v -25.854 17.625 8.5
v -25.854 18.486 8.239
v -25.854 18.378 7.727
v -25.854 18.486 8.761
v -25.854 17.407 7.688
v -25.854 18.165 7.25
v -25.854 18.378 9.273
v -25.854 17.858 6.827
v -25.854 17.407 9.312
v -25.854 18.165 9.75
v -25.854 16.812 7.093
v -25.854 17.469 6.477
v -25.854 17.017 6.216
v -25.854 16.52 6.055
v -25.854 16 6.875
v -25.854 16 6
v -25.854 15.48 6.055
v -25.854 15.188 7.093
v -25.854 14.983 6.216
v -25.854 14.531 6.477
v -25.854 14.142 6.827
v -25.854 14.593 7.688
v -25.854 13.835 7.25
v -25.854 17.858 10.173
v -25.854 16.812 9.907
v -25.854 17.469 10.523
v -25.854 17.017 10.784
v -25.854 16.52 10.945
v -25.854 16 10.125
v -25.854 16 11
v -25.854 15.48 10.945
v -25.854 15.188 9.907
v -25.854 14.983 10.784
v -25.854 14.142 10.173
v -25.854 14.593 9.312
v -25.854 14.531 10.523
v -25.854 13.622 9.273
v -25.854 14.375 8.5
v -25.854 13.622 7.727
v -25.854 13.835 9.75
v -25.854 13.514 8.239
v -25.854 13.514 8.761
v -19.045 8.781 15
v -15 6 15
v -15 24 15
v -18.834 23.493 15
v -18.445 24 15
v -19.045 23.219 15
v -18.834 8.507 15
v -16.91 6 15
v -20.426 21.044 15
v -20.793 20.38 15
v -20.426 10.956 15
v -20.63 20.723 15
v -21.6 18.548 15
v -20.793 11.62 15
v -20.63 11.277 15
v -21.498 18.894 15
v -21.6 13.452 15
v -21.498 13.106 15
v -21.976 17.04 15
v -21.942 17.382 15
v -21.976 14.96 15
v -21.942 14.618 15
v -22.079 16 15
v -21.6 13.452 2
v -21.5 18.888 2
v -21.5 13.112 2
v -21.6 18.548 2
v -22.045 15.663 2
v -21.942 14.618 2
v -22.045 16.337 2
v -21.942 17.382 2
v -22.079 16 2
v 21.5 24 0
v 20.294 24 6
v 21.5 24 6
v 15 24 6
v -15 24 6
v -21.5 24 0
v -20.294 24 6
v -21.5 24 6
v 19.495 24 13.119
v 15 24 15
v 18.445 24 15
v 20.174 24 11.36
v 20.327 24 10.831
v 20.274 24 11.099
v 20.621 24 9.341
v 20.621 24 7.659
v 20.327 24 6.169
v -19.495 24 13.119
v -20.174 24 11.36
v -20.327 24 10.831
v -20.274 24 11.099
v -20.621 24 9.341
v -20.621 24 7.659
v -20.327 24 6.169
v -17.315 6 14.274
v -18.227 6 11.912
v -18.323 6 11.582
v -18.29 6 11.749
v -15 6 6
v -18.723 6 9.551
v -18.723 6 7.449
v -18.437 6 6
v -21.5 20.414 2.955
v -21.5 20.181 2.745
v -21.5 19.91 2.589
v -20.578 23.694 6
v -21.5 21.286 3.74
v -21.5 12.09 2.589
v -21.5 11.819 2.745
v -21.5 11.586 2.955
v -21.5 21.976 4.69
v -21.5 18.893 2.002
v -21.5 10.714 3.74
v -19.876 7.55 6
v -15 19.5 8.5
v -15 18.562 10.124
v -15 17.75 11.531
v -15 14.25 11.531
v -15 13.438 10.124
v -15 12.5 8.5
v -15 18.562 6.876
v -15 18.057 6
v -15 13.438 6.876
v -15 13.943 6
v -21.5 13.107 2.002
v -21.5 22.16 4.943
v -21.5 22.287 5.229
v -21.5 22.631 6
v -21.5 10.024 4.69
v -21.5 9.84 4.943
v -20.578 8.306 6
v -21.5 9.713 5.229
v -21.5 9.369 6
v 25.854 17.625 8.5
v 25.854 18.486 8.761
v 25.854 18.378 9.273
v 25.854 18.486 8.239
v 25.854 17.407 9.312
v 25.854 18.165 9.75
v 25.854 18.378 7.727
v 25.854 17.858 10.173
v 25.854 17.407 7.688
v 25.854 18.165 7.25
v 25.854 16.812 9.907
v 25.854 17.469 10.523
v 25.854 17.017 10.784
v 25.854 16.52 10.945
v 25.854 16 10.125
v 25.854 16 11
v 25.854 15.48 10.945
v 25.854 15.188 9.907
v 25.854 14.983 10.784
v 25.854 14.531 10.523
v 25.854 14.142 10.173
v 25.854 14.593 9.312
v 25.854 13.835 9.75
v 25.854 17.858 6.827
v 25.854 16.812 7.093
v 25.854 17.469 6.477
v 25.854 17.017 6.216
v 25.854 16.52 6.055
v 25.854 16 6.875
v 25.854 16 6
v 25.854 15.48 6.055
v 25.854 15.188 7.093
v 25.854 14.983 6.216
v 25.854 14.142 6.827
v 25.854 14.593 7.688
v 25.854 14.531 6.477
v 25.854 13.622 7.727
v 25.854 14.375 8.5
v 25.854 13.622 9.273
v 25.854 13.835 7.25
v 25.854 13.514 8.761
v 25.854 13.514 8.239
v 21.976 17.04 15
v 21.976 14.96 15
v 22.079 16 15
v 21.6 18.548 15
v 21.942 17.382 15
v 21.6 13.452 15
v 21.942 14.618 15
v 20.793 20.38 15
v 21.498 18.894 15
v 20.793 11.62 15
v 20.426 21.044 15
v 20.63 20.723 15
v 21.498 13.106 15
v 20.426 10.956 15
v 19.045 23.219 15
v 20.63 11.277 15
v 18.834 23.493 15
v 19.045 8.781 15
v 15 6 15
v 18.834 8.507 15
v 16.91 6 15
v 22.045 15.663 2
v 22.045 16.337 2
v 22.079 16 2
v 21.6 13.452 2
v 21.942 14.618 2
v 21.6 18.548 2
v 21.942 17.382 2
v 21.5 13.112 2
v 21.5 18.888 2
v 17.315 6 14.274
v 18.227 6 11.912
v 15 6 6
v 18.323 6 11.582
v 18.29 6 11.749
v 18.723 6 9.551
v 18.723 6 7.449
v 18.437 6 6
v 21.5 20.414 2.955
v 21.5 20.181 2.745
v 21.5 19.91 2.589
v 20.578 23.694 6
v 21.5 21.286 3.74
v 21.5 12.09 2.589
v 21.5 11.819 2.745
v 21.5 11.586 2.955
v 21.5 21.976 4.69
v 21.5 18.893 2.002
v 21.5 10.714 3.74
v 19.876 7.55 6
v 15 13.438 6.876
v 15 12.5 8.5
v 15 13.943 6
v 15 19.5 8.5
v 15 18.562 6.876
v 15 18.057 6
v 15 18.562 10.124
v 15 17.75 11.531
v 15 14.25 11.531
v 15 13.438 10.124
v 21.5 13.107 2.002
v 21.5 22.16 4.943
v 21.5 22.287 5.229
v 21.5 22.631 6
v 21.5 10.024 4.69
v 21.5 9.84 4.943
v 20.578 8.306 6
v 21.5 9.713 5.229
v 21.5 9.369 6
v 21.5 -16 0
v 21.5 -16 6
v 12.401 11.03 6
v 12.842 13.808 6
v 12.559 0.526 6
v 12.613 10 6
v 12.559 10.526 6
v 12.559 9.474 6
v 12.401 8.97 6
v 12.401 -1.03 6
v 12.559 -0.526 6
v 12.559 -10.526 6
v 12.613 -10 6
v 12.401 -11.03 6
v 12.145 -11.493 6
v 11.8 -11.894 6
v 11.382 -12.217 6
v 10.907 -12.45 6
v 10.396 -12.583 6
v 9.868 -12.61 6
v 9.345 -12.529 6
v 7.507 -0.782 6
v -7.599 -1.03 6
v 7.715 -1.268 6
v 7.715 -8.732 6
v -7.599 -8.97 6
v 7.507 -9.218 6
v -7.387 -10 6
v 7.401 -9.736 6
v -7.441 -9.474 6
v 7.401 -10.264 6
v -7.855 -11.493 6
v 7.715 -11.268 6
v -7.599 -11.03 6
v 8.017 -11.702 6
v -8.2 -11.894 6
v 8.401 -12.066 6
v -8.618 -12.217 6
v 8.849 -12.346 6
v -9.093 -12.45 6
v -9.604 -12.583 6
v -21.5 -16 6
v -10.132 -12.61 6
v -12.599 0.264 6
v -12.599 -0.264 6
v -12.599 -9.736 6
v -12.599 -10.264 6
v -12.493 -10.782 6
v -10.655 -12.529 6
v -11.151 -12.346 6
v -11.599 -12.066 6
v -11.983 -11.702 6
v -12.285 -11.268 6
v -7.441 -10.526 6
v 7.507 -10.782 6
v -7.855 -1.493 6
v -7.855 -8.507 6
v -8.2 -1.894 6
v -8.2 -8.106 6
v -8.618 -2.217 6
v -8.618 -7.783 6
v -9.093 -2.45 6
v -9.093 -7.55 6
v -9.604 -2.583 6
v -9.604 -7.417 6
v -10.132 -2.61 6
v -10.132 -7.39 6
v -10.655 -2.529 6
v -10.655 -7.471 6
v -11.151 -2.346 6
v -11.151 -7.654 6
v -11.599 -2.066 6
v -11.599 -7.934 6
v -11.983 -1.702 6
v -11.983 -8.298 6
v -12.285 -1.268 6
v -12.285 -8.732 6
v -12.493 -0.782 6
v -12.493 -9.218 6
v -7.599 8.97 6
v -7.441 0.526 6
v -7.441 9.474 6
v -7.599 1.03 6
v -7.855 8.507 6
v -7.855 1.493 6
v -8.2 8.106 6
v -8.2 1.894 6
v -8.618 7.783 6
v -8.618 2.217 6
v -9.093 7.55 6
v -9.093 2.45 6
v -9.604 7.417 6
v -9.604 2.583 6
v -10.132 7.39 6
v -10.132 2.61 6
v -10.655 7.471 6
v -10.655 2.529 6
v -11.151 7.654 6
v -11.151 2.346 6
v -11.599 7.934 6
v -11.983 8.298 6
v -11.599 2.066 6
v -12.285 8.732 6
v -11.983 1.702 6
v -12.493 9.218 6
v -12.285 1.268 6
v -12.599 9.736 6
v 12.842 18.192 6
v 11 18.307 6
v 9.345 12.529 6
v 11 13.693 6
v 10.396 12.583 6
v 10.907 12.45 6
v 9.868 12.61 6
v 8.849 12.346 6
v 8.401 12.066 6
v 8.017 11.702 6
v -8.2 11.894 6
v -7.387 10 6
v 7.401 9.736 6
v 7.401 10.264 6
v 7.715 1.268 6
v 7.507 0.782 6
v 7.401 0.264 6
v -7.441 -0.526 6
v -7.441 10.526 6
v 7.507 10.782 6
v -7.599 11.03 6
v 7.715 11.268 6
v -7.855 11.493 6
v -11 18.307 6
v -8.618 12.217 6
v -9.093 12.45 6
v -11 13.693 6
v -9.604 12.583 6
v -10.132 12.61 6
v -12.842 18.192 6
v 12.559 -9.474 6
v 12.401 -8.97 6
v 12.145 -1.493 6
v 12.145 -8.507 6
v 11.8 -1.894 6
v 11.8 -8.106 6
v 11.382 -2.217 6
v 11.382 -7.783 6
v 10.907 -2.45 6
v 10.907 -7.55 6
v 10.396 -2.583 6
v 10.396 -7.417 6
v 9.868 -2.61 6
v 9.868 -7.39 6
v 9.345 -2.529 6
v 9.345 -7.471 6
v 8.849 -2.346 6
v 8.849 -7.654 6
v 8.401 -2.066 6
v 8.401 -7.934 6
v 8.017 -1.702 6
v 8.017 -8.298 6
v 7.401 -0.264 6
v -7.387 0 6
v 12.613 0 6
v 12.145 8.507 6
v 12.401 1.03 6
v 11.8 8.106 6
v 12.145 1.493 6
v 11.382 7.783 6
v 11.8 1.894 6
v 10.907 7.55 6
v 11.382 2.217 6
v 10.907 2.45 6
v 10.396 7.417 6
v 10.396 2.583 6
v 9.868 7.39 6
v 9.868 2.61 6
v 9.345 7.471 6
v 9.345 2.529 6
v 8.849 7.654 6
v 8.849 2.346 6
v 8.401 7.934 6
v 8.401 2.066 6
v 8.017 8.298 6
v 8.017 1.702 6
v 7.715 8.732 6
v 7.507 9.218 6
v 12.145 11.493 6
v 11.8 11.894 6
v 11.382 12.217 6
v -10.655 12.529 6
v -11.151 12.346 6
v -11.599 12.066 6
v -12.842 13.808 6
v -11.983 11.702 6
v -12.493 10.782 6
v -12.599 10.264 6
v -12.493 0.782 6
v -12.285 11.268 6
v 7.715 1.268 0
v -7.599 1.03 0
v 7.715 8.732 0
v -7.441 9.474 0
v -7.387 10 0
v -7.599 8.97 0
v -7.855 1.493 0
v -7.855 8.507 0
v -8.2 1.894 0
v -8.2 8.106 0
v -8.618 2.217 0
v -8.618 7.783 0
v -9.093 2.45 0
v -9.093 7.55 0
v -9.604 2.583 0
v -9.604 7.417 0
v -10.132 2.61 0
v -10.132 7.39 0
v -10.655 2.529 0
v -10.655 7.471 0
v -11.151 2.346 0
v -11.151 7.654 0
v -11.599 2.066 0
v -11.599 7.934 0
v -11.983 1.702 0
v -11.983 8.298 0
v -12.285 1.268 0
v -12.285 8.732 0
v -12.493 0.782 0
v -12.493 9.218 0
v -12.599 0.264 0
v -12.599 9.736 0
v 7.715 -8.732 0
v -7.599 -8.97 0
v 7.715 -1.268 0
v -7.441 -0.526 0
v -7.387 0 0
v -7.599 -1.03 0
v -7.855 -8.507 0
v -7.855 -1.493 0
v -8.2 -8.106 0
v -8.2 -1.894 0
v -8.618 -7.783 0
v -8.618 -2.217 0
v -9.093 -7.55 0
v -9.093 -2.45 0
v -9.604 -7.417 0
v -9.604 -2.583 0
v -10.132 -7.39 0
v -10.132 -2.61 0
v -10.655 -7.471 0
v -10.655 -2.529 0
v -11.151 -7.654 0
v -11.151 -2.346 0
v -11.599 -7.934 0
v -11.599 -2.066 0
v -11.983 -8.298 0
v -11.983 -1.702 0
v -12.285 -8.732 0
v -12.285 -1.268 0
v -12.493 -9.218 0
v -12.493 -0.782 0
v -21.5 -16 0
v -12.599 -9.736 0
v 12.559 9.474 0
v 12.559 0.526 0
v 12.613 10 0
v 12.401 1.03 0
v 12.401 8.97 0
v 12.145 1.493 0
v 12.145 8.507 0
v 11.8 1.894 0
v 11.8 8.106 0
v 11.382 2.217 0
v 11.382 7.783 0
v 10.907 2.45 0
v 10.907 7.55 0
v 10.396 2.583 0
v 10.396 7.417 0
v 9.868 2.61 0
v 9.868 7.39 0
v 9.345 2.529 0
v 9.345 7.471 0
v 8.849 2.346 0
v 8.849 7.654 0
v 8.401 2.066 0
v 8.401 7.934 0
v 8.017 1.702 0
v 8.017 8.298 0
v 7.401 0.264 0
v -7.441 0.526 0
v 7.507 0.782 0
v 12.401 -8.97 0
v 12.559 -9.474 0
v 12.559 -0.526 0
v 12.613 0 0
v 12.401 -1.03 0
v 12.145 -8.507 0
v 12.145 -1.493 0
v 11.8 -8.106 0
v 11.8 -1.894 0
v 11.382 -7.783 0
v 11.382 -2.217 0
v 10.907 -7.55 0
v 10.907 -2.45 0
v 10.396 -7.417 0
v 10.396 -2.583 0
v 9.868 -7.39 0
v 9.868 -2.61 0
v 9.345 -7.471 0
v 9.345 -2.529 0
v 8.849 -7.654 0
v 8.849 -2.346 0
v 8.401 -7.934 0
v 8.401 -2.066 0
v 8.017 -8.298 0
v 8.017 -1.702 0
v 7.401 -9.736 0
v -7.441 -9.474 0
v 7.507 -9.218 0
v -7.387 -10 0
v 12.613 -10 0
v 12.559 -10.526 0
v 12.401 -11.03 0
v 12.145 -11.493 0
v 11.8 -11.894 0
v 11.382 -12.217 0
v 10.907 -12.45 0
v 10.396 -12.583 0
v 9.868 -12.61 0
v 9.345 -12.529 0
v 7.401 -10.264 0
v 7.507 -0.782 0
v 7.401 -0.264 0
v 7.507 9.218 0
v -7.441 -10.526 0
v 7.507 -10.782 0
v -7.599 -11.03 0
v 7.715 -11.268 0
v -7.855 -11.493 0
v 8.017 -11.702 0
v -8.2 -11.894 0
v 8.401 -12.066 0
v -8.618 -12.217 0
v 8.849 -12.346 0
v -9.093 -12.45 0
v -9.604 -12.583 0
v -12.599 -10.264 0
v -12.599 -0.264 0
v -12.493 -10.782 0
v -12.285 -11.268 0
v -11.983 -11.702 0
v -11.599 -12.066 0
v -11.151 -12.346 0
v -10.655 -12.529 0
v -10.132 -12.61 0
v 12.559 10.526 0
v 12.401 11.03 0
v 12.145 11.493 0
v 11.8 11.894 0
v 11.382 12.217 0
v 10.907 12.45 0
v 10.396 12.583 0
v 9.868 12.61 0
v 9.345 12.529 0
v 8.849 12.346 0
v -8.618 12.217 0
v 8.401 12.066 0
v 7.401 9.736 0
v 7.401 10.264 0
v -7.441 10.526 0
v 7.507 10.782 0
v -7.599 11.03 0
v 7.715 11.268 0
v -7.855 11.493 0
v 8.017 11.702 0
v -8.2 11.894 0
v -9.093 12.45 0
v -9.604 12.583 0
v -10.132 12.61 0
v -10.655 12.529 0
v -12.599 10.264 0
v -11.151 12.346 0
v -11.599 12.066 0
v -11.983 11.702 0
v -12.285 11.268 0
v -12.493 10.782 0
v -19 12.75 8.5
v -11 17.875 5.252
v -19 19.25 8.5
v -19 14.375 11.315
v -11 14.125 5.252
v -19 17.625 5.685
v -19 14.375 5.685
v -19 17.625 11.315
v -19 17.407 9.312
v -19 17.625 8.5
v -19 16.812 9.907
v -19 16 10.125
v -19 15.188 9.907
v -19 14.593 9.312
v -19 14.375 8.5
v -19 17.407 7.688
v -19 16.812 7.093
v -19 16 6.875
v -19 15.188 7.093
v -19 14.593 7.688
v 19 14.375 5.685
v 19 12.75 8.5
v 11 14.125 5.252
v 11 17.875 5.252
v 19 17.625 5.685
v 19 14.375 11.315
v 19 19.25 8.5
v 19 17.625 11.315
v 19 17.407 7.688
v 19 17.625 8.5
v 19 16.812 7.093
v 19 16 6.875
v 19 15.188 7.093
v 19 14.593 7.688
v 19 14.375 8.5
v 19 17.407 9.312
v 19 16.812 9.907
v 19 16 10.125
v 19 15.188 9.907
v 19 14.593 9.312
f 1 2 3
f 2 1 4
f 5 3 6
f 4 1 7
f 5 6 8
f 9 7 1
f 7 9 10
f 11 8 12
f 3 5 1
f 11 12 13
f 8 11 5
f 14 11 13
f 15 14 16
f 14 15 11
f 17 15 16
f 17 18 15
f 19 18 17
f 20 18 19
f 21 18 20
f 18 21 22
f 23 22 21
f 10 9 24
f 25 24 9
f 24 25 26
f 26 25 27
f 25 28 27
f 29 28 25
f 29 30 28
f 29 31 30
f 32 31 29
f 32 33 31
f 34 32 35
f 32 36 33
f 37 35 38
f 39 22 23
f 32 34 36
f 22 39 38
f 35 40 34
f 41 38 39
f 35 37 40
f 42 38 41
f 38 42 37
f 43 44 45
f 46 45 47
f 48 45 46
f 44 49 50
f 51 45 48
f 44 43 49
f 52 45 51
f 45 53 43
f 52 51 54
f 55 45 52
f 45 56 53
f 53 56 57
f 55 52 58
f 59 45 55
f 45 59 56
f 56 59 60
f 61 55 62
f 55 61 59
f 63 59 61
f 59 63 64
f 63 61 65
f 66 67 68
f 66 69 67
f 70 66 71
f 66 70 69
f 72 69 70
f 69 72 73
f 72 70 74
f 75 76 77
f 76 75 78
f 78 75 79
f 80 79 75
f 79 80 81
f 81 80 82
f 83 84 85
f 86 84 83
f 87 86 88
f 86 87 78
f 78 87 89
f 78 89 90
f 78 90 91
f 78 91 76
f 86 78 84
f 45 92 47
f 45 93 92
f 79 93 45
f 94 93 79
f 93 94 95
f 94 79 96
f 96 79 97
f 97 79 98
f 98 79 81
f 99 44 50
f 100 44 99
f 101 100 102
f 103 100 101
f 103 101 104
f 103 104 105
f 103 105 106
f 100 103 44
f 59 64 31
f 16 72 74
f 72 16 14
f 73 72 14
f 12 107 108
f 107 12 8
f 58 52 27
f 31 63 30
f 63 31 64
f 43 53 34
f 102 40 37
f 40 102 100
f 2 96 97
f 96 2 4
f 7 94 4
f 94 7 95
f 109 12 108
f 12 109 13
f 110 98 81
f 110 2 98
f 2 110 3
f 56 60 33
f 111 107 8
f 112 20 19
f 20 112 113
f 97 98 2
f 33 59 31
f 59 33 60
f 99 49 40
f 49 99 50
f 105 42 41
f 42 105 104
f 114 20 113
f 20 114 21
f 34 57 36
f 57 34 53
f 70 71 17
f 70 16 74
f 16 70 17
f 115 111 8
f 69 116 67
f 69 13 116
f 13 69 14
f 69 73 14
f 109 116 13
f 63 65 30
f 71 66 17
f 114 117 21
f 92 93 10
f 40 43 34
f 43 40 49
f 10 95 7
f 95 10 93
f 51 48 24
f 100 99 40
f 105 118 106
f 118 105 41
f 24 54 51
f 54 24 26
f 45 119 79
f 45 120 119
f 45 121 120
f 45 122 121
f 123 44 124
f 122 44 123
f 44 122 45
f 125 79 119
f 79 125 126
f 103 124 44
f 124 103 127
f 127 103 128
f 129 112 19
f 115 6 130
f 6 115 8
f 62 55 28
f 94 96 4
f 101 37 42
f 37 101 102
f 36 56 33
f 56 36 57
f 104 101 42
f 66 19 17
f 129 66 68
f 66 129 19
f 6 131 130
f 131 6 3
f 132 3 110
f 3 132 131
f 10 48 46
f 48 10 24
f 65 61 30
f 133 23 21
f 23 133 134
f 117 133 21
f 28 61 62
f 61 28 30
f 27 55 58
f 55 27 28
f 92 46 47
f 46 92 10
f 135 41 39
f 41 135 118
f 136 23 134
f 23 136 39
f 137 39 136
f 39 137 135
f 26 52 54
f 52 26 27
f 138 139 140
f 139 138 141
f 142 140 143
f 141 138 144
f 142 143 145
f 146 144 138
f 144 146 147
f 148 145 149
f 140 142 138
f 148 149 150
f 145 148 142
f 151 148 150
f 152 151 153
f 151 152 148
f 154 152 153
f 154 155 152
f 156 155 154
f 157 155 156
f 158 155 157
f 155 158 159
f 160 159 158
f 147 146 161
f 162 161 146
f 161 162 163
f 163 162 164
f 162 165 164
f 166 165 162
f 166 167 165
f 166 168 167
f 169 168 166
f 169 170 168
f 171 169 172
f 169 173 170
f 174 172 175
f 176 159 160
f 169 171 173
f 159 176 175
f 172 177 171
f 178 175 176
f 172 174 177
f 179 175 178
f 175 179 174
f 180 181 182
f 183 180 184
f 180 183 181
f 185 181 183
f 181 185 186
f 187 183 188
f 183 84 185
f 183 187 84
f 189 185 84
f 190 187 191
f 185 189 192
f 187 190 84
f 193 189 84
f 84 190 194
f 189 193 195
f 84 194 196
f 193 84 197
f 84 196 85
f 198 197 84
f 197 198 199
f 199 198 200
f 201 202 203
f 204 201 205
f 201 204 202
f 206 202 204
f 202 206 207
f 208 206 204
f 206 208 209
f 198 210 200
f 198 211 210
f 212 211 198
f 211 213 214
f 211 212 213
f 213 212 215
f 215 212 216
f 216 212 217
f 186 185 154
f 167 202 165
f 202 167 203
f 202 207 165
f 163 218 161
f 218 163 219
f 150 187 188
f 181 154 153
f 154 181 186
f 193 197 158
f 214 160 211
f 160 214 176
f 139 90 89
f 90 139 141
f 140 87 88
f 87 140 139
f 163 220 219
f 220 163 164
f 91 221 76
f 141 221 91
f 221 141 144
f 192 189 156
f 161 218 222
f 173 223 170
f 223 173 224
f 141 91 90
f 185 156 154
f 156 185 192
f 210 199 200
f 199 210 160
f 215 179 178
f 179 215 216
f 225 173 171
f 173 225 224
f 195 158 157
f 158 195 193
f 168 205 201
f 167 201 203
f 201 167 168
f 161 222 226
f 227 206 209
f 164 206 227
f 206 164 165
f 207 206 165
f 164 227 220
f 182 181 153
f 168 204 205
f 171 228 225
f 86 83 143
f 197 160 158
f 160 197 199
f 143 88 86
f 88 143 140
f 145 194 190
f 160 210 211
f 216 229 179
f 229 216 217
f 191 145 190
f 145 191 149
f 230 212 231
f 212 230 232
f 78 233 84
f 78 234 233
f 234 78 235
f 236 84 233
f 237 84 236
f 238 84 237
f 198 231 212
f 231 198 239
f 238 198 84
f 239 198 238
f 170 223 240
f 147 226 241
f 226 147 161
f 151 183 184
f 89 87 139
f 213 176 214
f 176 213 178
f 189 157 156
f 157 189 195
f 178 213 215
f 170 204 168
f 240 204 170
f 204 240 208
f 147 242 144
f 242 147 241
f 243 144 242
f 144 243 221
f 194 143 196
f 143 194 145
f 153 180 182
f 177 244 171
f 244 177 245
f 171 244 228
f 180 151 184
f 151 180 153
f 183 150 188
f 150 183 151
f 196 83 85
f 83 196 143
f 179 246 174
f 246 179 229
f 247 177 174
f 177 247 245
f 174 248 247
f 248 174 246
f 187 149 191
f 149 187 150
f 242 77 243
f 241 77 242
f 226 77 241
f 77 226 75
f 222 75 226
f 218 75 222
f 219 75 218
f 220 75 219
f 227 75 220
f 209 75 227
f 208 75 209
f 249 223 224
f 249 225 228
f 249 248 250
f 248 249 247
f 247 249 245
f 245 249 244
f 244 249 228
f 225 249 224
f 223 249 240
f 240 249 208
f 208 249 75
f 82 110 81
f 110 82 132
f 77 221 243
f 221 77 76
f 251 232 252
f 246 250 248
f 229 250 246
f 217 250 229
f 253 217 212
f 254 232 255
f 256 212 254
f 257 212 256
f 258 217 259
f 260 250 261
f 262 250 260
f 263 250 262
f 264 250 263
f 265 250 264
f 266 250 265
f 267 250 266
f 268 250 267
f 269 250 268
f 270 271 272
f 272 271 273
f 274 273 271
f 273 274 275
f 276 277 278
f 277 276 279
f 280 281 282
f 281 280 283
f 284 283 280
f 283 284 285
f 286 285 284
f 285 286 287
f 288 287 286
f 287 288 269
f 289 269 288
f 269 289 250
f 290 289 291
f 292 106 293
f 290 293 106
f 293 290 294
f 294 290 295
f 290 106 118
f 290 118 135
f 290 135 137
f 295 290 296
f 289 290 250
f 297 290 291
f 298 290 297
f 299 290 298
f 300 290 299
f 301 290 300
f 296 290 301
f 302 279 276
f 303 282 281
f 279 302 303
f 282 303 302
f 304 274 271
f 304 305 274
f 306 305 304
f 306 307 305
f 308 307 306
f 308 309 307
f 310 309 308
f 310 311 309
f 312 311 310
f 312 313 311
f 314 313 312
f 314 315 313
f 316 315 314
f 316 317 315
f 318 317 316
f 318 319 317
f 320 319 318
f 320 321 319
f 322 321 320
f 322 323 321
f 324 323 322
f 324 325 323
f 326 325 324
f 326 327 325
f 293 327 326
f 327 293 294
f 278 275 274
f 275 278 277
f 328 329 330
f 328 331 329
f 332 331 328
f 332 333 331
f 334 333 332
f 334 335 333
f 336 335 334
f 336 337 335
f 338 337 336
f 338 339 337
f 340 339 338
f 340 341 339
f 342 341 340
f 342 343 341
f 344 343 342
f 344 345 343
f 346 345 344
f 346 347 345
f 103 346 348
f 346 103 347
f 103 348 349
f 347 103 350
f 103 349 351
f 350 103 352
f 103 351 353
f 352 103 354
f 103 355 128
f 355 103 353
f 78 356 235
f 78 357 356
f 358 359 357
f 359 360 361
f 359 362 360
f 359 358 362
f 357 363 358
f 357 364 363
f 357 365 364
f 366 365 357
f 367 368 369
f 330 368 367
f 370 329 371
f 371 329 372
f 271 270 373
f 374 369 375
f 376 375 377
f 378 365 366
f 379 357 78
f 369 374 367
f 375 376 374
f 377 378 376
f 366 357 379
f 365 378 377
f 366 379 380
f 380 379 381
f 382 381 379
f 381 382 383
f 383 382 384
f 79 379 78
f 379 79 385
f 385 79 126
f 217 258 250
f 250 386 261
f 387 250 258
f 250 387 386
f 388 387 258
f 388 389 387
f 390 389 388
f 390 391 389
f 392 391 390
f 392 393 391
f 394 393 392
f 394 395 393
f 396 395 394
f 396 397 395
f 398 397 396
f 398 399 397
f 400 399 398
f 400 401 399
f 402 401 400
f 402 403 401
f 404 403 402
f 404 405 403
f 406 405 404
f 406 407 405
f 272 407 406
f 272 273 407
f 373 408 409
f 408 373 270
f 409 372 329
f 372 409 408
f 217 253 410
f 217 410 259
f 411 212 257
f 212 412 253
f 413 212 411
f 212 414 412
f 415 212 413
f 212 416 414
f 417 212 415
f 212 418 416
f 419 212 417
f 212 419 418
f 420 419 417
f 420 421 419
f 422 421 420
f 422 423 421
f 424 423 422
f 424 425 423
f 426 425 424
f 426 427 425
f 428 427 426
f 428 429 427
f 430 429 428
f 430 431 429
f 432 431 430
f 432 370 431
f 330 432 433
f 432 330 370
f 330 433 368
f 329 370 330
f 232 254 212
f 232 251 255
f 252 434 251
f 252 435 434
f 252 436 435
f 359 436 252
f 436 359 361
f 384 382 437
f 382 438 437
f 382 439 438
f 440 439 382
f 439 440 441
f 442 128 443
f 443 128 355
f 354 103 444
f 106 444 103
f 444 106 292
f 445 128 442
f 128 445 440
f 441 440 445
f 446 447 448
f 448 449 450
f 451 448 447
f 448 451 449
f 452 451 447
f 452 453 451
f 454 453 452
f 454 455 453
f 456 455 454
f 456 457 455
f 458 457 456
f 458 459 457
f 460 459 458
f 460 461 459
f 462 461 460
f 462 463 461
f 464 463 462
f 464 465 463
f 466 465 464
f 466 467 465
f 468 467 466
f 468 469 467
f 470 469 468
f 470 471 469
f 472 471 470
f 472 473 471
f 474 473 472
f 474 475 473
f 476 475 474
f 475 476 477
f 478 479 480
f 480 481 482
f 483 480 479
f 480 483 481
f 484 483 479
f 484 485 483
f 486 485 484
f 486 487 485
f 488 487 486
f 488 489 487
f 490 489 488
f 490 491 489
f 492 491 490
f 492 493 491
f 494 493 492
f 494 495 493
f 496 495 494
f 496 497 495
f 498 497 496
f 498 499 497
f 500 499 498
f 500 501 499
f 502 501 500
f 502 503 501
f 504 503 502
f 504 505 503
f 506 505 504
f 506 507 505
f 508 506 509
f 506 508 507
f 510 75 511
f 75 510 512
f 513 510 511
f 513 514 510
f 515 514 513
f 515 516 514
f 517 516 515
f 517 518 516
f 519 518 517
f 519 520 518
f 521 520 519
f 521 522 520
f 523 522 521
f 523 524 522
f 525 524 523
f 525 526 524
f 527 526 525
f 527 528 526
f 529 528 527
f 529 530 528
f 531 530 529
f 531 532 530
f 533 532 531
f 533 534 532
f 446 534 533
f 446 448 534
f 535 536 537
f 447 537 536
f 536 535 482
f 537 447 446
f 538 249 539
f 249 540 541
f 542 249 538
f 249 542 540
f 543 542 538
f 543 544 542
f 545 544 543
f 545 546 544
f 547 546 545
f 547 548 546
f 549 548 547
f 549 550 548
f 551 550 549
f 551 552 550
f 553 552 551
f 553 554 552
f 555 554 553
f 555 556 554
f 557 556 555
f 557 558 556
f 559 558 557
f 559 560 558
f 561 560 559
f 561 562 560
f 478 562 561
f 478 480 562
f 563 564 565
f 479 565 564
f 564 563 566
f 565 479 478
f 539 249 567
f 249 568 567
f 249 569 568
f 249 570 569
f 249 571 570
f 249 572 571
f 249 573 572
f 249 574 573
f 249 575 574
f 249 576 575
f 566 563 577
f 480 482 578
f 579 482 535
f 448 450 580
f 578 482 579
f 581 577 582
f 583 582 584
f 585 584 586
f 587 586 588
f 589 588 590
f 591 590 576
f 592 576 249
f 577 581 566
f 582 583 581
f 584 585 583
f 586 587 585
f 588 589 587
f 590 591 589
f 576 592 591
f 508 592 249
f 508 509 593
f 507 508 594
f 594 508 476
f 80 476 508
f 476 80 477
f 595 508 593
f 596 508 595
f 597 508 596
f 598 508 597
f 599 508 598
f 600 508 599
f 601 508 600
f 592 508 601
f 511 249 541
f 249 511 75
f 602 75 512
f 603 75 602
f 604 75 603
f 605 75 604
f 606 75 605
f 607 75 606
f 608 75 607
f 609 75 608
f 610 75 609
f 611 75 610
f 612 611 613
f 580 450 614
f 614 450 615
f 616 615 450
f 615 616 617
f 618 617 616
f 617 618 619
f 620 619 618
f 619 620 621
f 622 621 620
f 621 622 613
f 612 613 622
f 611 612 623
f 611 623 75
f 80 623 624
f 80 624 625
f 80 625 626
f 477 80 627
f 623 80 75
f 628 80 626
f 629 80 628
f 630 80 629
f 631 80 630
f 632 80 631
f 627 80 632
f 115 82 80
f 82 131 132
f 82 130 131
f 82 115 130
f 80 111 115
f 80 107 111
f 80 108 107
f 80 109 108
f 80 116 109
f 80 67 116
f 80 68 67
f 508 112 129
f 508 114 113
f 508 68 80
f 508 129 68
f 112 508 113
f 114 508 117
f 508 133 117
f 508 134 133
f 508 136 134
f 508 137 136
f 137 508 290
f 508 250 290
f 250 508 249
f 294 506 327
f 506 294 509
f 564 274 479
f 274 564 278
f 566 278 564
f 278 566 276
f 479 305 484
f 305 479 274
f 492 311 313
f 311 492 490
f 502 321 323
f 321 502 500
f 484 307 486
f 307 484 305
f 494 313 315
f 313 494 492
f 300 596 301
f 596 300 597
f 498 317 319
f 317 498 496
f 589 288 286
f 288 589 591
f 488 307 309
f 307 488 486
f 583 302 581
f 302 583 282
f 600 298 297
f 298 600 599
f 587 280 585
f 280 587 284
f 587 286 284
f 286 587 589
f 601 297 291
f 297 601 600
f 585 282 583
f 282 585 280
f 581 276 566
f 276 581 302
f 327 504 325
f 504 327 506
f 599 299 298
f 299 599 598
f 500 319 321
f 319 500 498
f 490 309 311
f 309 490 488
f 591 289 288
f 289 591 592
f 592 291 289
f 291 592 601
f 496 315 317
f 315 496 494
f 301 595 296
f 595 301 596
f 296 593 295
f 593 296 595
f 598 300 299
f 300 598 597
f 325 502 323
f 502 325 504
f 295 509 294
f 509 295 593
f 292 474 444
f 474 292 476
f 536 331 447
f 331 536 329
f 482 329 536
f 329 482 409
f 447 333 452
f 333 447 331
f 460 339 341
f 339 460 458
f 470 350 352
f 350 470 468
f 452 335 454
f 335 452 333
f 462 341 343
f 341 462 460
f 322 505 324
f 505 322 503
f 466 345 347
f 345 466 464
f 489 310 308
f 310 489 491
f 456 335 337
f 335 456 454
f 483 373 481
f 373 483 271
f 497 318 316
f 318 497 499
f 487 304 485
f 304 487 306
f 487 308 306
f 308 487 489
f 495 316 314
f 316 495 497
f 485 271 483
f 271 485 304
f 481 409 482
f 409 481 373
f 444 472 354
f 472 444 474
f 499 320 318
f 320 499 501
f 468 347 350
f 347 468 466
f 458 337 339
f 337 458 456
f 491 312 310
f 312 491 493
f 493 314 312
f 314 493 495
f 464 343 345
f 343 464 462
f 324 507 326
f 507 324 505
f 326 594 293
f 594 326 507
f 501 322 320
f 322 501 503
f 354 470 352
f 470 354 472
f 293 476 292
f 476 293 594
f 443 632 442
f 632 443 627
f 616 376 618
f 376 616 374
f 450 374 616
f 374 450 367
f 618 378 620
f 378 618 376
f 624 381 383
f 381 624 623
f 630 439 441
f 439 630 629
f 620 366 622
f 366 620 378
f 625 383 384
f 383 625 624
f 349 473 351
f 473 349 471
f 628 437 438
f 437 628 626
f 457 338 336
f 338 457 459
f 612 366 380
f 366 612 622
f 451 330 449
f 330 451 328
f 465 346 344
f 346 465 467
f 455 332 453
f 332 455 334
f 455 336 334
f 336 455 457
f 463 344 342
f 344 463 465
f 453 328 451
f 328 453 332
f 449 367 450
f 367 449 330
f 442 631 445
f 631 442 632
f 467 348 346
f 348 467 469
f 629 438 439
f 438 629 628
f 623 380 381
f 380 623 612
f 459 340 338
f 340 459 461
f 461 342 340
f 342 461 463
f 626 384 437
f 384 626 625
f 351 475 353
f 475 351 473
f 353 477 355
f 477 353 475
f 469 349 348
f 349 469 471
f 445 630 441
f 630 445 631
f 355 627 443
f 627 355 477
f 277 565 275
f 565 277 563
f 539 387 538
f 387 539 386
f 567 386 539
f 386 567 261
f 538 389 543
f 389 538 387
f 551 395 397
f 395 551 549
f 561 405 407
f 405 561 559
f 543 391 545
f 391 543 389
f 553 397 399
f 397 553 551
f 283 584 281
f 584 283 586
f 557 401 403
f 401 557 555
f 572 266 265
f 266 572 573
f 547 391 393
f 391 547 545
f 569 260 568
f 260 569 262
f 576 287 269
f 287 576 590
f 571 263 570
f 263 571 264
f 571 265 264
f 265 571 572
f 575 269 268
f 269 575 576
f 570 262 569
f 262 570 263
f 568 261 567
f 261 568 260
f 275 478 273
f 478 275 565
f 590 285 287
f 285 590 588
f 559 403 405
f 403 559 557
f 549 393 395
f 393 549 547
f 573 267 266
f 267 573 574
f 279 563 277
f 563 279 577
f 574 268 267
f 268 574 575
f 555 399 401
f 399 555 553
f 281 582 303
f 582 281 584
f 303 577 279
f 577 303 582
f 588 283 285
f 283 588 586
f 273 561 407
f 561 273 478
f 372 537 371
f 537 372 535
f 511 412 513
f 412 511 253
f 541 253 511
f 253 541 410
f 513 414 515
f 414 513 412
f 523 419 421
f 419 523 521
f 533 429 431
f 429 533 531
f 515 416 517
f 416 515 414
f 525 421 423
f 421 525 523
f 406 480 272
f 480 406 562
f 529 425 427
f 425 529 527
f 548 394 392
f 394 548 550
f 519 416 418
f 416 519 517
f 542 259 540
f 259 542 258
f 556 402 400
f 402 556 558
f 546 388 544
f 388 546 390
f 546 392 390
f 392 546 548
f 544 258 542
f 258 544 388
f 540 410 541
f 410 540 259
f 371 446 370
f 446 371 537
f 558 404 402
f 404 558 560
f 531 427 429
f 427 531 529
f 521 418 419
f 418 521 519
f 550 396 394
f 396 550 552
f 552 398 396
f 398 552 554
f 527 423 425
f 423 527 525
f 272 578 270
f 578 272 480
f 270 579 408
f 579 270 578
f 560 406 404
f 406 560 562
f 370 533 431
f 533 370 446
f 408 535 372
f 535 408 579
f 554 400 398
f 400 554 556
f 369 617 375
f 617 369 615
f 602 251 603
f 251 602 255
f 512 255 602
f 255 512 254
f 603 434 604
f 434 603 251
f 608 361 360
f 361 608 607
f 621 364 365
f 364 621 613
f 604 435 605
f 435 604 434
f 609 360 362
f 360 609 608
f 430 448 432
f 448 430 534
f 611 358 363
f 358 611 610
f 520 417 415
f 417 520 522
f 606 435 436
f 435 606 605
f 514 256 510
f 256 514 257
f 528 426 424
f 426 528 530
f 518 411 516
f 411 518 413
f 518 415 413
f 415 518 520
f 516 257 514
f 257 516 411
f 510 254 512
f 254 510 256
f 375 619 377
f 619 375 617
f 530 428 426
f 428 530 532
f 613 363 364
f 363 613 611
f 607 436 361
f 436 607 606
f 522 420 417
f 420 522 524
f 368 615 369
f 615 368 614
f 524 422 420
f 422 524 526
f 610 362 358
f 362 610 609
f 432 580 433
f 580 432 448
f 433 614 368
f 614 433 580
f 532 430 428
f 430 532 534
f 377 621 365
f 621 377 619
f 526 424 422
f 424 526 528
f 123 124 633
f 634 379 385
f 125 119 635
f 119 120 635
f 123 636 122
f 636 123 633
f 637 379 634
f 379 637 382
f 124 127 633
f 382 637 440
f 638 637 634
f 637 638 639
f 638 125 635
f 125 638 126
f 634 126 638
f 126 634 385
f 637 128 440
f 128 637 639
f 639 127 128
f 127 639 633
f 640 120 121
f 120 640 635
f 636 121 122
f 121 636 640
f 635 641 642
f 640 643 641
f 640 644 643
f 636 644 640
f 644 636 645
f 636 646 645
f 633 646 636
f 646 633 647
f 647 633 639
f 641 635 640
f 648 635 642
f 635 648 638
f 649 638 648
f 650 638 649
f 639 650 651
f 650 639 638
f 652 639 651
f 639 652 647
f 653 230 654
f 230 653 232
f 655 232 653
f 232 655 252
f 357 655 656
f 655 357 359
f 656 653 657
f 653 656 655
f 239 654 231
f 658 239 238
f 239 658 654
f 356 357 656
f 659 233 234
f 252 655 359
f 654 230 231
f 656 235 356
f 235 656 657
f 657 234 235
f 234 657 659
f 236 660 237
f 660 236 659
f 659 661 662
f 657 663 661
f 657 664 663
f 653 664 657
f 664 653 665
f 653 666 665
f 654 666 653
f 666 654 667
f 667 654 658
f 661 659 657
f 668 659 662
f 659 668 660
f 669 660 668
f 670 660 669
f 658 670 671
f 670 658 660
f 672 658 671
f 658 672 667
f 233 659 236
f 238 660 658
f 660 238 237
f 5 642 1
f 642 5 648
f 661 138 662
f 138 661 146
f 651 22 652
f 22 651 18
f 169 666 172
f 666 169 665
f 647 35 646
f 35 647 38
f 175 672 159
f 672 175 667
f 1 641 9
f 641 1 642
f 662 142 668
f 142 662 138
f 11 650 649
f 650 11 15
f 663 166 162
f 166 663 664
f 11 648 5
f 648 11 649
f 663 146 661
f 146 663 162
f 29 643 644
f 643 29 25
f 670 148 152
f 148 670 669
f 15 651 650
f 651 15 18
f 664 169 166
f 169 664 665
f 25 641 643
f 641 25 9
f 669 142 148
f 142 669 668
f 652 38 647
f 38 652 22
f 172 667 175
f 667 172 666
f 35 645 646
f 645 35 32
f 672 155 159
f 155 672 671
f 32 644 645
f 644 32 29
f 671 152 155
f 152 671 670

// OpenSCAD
// file: myLibs.scad
pi= 3.14159265359;

module hole(diam, height, clearance= 0.1)
{
        fn= round(diam * pi / 0.5);
        cylinder(h= height, r=diam / 2 / cos(180 / fn) + clearance, $fn=fn);
}

module nutTrap(ffd, faces=6, height=1)
{
	cylinder(h= height, r=ffd / cos(180 / faces) / 2 + 0.05, $fn=faces);
}

// A slot which has rounded ends, but total length is l
module slot(d= 4, l= 8, ht= 1, clearance=0.1) {
	fn= round(d * pi / 0.5);
	rd= d / 2 / cos(180 / fn) + clearance;
	d1= rd*2;
	union() {
		translate([0,0,ht/2]) cube([l-d1, d1, ht], center=true);
		translate([-(l-d1)/2, 0, ht/2]) cylinder(h=ht, r=rd, $fn=fn, center=true);
		translate([(l-d1)/2, 0, ht/2]) cylinder(h=ht, r=rd, $fn=fn, center=true);
	}
}

module nslot(d=4, l= 8, ht=1, clearance=0.1) {
	x= l-(d+clearance);
	hull() {
		translate([x/2, 0, 0])  hole(d, ht, clearance);
		translate([-x/2,0,0]) hole(d,ht, clearance);
	}
}

module rounded_base(w, l, r, h) {
	v1= [w/2-r, l/2-r, 0];
	v2= [-w/2+r, -l/2+r, 0];
	v3= [-w/2+r, l/2-r, 0];
	v4= [w/2-r, -l/2+r, 0];
	hull() {
		translate(v1) cylinder(r= r, h=h);
		translate(v2) cylinder(r= r, h=h);
		translate(v3) cylinder(r= r, h=h);
		translate(v4) cylinder(r= r, h=h);
	}
}
// file: carriage_plate_standard_c14005_rev_2.scad
// MakerSlide Component
// http://www.makerslide.com
// c14005_rev_2
// Standard Wheel Carriage Plate
// Original by Barton Dring
// OpenSCAD model by Mike Sheldrake

centeredCarriagePlate();

module centeredCarriagePlate() {
	translate([-90/2,-160/2,0]) standard_wheel_carriage_plate();
}

module standard_wheel_carriage_plate(thickness=3.175) {
color([175/255,178/255,183/255])
difference() {

// 90mm by 160mm plate 
// 3.175mm thick by default,
// but you can pass a different thickness to this module
cube([90,160,3.175],center=false);

// 5mm diam. holes
for(i=[
  [12.7,10],
  [12.7,30],
  [12.7,70],
  [12.7,80],
  [12.7,90],
  [12.7,112.3],
  [12.7,130],
  [12.7,150],
  [35,10],
  [35,60],
  [35,80],
  [35,100],
  [35,150],
  [45,70],
  [45,90],
  [55,10],
  [55,60],
  [55,80],
  [55,100],
  [55,150],
  [77.3,30],
  [77.3,70],
  [77.3,90],
  [77.3,112.3],
  [77.3,130],

  //These are 5mm holes in the 7mm hole spots that we will do next.
  //For some reason including them here too makes the OpenCSG display look right.
  //Not needed for CGAL render though.
  [12.7,47.7],
  [45,47.7],
  [77.3,10],
  [77.3,47.7],
  [77.3,80],
  [77.3,150]

  ]) { translate([i[0],i[1],-0.2]) cylinder(h=thickness+1,r=5/2,center=false); }

// 7mm diam. holes 
for(i=[
  [12.7,47.7],
  [45,47.7],
  [77.3,10],
  [77.3,47.7],
  [77.3,80],
  [77.3,150]
  ]) { translate([i[0],i[1],-0.2]) cylinder(h=thickness+1,r=7/2,center=false); }

// rounded corners on plate 
for(i=[
  [0,0,0],
  [90,160,180],
  [90,0,90],
  [0,160,270]
  ]
  ) {
	translate([i[0],i[1],0]) rotate(a=[0,0,i[2]]) translate([10,10,-0.1]) rotate(a=[0,0,180]) difference() {
		cube([11,11,thickness+1],center=false);
		translate([0,0,-0.1]) cylinder(h=thickness+2,r=10,center=false);
		}
	}
}
}
// file: configuration.scad
// Increase this if your slicer or printer make holes too tight.
extra_radius = 0.0;

// OD = outside diameter, corner to corner.
m3_nut_od = 6.1;
m3_nut_radius = m3_nut_od/2 + 0.2 + extra_radius;

// Major diameter of metric 3mm thread.
m3_major = 2.85;
m3_radius = m3_major/2 + extra_radius;
m3_wide_radius = m3_major/2 + 0.2 + extra_radius;

// NEMA17 stepper motors.
motor_shaft_diameter = 5;
motor_shaft_radius = motor_shaft_diameter/2 + extra_radius;

// Frame brackets.
thickness = 3.6;
// main file
/*
 * Based on Johanns mini kossel design
 * https://github.com/jcrocholl/kossel
 */
include <configuration.scad>;

use <carriage_plate_standard_c14005_rev_2.scad>
use <myLibs.scad>

//separation = 40;
ratio= 1.39;
separation = 37.2*ratio;
echo(str("Separation= ", separation));

thickness = 6;

horn_thickness = 13;
horn_x = 15;
horn_offset = 2;

belt_width = 6;
belt_x = 5.6;
belt_z = 7;

module carriage() {
  // Timing belt (up and down).
  translate([-belt_x, 0, belt_z + belt_width/2]) %
    cube([1.7, 100, belt_width], center=true);
  translate([belt_x, 0, belt_z + belt_width/2]) %
    cube([1.7, 100, belt_width], center=true);
  difference() {
    union() {
      // Main body.
      translate([0, 4, thickness/2])
        cube([43, 40, thickness], center=true);
      // Ball joint mount horns.
      for (x = [-1, 1]) {
        scale([x, 1, 1]) intersection() {
          translate([0, 15, horn_thickness/2+horn_offset])
            cube([separation, 18, horn_thickness], center=true);
          translate([horn_x, 16, horn_thickness/2+horn_offset]) rotate([0, 90, 0])
            cylinder(r1=14, r2=2.5, h=separation/2-horn_x);
        }
      }
      // Belt clamps.
      *difference() {
        union() {
          translate([6.5, -2.5, horn_thickness/2+1])
            cube([14, 7, horn_thickness-2], center=true);
          translate([10.75, 2.5, horn_thickness/2+1])
            cube([5.5, 16, horn_thickness-2], center=true);
        }
        // Avoid touching diagonal push rods (carbon tube).
        translate([20, -10, 12.5]) rotate([35, 35, 30])
          cube([40, 40, 20], center=true);
      }
      *for (y = [-12, 7]) {
        translate([1.25, y, horn_thickness/2+1])
          cube([7, 8, horn_thickness-2], center=true);
      }
    }
    // Screws for linear slider.
    for (x = [-10, 10]) {
      for (y = [-10, 0, 10]) {
        #translate([x, y, thickness-30/2]) hole(5, 30);
      }
    }
    // Screws for ball joints.
    translate([0, 16, horn_thickness/2+horn_offset]) rotate([0, 90, 0]) #
      cylinder(r=m3_wide_radius, h=60, center=true, $fn=12);
    // Lock nuts for ball joints.
    for (x = [-1, 1]) {
      scale([x, 1, 1]) intersection() {
        translate([horn_x, 16, horn_thickness/2+horn_offset]) rotate([90, 0, -90])
          cylinder(r1=m3_nut_radius, r2=m3_nut_radius+0.5, h=8,
                   center=true, $fn=6);
      }
    }
  }
}

carriage();

%translate([0,-10,-3.175]) rotate([0,0,0]) translate([-90/2,-160/2,0]) standard_wheel_carriage_plate();
//%translate([0,0,-3.175]) rotate([0,0,90]) translate([-90/2,-160/2,0]) standard_wheel_carriage_plate();
